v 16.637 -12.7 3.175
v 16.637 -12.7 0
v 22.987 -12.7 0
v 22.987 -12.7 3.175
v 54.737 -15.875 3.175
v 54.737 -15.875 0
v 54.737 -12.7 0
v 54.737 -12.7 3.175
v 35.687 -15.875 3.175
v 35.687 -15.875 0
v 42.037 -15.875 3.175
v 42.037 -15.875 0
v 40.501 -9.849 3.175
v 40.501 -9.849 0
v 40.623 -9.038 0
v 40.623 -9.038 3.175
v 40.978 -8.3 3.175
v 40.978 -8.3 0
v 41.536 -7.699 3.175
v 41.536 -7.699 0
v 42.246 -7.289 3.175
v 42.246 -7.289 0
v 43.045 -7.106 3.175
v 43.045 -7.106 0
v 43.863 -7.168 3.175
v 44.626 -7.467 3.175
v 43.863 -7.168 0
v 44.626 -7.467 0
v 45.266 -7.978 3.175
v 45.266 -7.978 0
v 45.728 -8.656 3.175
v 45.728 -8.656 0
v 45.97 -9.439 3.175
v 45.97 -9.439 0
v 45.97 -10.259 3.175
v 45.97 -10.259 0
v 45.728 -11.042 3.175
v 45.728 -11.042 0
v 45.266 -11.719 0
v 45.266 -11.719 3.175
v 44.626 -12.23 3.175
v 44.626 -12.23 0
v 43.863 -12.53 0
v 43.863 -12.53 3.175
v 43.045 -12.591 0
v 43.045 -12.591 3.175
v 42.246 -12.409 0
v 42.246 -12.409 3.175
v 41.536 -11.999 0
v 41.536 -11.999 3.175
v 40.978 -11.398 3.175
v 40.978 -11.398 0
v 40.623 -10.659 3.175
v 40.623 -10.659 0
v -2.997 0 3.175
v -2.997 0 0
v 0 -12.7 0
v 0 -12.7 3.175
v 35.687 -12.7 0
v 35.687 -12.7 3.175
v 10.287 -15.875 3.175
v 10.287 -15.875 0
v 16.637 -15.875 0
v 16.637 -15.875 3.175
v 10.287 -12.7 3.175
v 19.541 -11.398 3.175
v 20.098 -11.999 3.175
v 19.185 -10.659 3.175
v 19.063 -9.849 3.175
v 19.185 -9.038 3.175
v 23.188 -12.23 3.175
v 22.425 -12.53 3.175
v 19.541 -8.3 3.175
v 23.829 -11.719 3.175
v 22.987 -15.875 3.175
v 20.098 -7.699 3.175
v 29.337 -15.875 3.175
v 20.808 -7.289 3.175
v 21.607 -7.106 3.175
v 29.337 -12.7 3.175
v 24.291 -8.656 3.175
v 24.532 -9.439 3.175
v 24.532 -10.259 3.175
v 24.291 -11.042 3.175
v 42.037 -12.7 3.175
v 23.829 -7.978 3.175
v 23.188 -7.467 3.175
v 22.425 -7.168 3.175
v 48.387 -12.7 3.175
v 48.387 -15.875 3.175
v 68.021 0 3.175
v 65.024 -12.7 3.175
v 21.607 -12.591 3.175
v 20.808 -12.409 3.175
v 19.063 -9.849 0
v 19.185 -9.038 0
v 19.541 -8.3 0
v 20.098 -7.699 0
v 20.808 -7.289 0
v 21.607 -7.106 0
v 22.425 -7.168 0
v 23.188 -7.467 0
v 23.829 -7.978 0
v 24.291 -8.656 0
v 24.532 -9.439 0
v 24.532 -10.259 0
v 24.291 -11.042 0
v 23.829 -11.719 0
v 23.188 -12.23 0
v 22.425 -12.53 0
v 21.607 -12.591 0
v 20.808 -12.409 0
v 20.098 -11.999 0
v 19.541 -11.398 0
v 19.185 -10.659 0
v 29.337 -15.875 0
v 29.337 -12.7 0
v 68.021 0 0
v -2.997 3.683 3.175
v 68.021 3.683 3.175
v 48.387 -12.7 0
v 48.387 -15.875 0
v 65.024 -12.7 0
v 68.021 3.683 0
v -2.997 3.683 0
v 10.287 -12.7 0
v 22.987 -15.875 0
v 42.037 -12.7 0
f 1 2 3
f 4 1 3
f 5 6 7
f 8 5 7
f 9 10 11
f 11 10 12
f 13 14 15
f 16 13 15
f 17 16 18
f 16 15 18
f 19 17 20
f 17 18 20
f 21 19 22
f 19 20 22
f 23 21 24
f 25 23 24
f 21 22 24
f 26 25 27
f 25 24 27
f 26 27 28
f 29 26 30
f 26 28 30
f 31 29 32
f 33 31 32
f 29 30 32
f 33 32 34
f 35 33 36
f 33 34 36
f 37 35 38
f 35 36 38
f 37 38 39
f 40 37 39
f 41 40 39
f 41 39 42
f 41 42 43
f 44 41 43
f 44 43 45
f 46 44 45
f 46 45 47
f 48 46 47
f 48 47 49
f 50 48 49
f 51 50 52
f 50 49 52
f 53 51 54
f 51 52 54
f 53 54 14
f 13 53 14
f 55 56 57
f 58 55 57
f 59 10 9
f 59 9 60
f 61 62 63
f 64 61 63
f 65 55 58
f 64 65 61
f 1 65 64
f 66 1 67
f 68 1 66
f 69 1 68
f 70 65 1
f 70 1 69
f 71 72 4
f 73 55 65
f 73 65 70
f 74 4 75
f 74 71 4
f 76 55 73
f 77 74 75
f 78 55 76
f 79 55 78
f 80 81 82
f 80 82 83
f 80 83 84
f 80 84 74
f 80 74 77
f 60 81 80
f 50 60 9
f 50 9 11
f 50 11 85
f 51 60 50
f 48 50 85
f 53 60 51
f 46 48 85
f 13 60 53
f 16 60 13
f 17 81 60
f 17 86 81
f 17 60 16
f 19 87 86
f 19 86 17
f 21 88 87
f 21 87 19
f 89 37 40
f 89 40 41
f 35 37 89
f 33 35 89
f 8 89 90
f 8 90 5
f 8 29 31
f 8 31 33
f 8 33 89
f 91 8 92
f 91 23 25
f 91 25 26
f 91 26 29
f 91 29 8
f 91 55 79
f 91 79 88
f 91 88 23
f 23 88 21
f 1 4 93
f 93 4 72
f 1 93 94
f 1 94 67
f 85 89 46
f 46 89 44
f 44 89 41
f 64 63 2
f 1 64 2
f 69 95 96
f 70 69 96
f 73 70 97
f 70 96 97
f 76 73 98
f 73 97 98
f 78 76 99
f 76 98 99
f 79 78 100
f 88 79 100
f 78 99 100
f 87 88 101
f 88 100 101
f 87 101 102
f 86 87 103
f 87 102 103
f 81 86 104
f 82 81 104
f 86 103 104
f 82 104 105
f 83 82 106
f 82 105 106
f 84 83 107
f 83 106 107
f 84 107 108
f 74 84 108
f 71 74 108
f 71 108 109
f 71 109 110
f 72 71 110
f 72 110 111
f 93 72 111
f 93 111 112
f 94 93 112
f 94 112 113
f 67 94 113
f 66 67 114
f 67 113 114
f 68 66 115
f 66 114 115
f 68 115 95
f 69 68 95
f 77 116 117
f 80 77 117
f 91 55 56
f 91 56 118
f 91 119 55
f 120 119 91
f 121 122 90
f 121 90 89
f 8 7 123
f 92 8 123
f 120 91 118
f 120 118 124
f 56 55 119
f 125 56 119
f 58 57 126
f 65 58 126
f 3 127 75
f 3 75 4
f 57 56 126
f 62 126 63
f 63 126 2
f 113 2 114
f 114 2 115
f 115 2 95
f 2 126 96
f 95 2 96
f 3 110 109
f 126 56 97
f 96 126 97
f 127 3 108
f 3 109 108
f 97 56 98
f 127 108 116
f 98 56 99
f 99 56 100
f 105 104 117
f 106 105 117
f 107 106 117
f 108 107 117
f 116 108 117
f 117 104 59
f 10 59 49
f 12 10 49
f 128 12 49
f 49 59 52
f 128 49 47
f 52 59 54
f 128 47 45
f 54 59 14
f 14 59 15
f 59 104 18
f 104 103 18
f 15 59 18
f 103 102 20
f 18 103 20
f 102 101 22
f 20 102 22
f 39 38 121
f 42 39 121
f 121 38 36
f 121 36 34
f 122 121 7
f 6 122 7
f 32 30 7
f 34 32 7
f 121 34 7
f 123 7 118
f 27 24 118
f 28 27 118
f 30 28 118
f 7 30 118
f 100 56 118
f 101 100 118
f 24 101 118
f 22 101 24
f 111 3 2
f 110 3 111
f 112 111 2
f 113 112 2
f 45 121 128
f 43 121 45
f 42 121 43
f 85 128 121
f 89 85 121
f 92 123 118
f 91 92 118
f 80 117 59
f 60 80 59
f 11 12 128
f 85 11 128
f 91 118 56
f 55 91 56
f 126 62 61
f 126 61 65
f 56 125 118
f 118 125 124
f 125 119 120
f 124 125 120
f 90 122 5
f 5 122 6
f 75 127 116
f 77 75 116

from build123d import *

# Parameters (mm, degrees)
SKETCH1_W           = 6.35
SKETCH1_H           = 3.175
BOSS_EXTRUDE1_DEPTH = 3.175
SKETCH2_W           = 56.563224847
SKETCH2_H           = 4.367971222
CUT_EXTRUDE2_DEPTH  = 10
SKETCH3_R           = 2.75
CUT_EXTRUDE3_DEPTH  = 3.175
SKETCH4_W           = 71.0184
SKETCH4_H           = 3.683
BOSS_EXTRUDE2_DEPTH = 3.175


with BuildPart() as part:
    # Sketch1 → Boss-Extrude1 (new body)
    with BuildSketch(Plane.XY):
        Polygon((10.287, 0), (0, 0), (-2.9972, 0), (0, -12.7), (10.287, -12.7), (16.637, -12.7), (22.987, -12.7), (29.337, -12.7), (35.687, -12.7), (42.037, -12.7), (48.387, -12.7), (54.737, -12.7), (65.024, -12.7), (68.0212, 0), (65.024, 0), (54.737, 0), (48.387, 0), (42.037, 0), (35.687, 0), (29.337, 0), (22.987, 0), (16.637, 0), align=None)
        with Locations((13.462, 1.5875)):
            Rectangle(SKETCH1_W, SKETCH1_H)
        with Locations((26.162, 1.5875)):
            Rectangle(SKETCH1_W, SKETCH1_H)
        with Locations((51.562, 1.5875)):
            Rectangle(SKETCH1_W, SKETCH1_H)
        with Locations((51.562, -14.2875)):
            Rectangle(SKETCH1_W, SKETCH1_H)
        with Locations((38.862, -14.2875)):
            Rectangle(SKETCH1_W, SKETCH1_H)
        with Locations((26.162, -14.2875)):
            Rectangle(SKETCH1_W, SKETCH1_H)
        with Locations((13.462, -14.2875)):
            Rectangle(SKETCH1_W, SKETCH1_H)
        with Locations((38.862, 1.5875)):
            Rectangle(SKETCH1_W, SKETCH1_H)
    extrude(amount=BOSS_EXTRUDE1_DEPTH)

    # Sketch2 → Cut-Extrude2 (cut)
    with BuildSketch(Plane.XY.offset(3.175)):
        with Locations((31.926512424, 2.183985611)):
            Rectangle(SKETCH2_W, SKETCH2_H)
    extrude(amount=-CUT_EXTRUDE2_DEPTH, mode=Mode.SUBTRACT)

    # Sketch3 → Cut-Extrude3 (cut)
    with BuildSketch(Plane(origin=(0, 0, 0), x_dir=(-1, 0, 0), z_dir=(0, 0, -1))):
        with Locations((-21.81296982, -9.8488)):
            Circle(SKETCH3_R)
        with Locations((-43.25056982, -9.8488)):
            Circle(SKETCH3_R)
    extrude(amount=-CUT_EXTRUDE3_DEPTH, mode=Mode.SUBTRACT)


with BuildPart() as body_2:
    # Sketch4 → Boss-Extrude2 (new body)
    with BuildSketch(Plane.XY.offset(3.175)):
        with Locations((32.512, 1.8415)):
            Rectangle(SKETCH4_W, SKETCH4_H)
    extrude(amount=-BOSS_EXTRUDE2_DEPTH)


solid = Compound([part.part, body_2.part])
